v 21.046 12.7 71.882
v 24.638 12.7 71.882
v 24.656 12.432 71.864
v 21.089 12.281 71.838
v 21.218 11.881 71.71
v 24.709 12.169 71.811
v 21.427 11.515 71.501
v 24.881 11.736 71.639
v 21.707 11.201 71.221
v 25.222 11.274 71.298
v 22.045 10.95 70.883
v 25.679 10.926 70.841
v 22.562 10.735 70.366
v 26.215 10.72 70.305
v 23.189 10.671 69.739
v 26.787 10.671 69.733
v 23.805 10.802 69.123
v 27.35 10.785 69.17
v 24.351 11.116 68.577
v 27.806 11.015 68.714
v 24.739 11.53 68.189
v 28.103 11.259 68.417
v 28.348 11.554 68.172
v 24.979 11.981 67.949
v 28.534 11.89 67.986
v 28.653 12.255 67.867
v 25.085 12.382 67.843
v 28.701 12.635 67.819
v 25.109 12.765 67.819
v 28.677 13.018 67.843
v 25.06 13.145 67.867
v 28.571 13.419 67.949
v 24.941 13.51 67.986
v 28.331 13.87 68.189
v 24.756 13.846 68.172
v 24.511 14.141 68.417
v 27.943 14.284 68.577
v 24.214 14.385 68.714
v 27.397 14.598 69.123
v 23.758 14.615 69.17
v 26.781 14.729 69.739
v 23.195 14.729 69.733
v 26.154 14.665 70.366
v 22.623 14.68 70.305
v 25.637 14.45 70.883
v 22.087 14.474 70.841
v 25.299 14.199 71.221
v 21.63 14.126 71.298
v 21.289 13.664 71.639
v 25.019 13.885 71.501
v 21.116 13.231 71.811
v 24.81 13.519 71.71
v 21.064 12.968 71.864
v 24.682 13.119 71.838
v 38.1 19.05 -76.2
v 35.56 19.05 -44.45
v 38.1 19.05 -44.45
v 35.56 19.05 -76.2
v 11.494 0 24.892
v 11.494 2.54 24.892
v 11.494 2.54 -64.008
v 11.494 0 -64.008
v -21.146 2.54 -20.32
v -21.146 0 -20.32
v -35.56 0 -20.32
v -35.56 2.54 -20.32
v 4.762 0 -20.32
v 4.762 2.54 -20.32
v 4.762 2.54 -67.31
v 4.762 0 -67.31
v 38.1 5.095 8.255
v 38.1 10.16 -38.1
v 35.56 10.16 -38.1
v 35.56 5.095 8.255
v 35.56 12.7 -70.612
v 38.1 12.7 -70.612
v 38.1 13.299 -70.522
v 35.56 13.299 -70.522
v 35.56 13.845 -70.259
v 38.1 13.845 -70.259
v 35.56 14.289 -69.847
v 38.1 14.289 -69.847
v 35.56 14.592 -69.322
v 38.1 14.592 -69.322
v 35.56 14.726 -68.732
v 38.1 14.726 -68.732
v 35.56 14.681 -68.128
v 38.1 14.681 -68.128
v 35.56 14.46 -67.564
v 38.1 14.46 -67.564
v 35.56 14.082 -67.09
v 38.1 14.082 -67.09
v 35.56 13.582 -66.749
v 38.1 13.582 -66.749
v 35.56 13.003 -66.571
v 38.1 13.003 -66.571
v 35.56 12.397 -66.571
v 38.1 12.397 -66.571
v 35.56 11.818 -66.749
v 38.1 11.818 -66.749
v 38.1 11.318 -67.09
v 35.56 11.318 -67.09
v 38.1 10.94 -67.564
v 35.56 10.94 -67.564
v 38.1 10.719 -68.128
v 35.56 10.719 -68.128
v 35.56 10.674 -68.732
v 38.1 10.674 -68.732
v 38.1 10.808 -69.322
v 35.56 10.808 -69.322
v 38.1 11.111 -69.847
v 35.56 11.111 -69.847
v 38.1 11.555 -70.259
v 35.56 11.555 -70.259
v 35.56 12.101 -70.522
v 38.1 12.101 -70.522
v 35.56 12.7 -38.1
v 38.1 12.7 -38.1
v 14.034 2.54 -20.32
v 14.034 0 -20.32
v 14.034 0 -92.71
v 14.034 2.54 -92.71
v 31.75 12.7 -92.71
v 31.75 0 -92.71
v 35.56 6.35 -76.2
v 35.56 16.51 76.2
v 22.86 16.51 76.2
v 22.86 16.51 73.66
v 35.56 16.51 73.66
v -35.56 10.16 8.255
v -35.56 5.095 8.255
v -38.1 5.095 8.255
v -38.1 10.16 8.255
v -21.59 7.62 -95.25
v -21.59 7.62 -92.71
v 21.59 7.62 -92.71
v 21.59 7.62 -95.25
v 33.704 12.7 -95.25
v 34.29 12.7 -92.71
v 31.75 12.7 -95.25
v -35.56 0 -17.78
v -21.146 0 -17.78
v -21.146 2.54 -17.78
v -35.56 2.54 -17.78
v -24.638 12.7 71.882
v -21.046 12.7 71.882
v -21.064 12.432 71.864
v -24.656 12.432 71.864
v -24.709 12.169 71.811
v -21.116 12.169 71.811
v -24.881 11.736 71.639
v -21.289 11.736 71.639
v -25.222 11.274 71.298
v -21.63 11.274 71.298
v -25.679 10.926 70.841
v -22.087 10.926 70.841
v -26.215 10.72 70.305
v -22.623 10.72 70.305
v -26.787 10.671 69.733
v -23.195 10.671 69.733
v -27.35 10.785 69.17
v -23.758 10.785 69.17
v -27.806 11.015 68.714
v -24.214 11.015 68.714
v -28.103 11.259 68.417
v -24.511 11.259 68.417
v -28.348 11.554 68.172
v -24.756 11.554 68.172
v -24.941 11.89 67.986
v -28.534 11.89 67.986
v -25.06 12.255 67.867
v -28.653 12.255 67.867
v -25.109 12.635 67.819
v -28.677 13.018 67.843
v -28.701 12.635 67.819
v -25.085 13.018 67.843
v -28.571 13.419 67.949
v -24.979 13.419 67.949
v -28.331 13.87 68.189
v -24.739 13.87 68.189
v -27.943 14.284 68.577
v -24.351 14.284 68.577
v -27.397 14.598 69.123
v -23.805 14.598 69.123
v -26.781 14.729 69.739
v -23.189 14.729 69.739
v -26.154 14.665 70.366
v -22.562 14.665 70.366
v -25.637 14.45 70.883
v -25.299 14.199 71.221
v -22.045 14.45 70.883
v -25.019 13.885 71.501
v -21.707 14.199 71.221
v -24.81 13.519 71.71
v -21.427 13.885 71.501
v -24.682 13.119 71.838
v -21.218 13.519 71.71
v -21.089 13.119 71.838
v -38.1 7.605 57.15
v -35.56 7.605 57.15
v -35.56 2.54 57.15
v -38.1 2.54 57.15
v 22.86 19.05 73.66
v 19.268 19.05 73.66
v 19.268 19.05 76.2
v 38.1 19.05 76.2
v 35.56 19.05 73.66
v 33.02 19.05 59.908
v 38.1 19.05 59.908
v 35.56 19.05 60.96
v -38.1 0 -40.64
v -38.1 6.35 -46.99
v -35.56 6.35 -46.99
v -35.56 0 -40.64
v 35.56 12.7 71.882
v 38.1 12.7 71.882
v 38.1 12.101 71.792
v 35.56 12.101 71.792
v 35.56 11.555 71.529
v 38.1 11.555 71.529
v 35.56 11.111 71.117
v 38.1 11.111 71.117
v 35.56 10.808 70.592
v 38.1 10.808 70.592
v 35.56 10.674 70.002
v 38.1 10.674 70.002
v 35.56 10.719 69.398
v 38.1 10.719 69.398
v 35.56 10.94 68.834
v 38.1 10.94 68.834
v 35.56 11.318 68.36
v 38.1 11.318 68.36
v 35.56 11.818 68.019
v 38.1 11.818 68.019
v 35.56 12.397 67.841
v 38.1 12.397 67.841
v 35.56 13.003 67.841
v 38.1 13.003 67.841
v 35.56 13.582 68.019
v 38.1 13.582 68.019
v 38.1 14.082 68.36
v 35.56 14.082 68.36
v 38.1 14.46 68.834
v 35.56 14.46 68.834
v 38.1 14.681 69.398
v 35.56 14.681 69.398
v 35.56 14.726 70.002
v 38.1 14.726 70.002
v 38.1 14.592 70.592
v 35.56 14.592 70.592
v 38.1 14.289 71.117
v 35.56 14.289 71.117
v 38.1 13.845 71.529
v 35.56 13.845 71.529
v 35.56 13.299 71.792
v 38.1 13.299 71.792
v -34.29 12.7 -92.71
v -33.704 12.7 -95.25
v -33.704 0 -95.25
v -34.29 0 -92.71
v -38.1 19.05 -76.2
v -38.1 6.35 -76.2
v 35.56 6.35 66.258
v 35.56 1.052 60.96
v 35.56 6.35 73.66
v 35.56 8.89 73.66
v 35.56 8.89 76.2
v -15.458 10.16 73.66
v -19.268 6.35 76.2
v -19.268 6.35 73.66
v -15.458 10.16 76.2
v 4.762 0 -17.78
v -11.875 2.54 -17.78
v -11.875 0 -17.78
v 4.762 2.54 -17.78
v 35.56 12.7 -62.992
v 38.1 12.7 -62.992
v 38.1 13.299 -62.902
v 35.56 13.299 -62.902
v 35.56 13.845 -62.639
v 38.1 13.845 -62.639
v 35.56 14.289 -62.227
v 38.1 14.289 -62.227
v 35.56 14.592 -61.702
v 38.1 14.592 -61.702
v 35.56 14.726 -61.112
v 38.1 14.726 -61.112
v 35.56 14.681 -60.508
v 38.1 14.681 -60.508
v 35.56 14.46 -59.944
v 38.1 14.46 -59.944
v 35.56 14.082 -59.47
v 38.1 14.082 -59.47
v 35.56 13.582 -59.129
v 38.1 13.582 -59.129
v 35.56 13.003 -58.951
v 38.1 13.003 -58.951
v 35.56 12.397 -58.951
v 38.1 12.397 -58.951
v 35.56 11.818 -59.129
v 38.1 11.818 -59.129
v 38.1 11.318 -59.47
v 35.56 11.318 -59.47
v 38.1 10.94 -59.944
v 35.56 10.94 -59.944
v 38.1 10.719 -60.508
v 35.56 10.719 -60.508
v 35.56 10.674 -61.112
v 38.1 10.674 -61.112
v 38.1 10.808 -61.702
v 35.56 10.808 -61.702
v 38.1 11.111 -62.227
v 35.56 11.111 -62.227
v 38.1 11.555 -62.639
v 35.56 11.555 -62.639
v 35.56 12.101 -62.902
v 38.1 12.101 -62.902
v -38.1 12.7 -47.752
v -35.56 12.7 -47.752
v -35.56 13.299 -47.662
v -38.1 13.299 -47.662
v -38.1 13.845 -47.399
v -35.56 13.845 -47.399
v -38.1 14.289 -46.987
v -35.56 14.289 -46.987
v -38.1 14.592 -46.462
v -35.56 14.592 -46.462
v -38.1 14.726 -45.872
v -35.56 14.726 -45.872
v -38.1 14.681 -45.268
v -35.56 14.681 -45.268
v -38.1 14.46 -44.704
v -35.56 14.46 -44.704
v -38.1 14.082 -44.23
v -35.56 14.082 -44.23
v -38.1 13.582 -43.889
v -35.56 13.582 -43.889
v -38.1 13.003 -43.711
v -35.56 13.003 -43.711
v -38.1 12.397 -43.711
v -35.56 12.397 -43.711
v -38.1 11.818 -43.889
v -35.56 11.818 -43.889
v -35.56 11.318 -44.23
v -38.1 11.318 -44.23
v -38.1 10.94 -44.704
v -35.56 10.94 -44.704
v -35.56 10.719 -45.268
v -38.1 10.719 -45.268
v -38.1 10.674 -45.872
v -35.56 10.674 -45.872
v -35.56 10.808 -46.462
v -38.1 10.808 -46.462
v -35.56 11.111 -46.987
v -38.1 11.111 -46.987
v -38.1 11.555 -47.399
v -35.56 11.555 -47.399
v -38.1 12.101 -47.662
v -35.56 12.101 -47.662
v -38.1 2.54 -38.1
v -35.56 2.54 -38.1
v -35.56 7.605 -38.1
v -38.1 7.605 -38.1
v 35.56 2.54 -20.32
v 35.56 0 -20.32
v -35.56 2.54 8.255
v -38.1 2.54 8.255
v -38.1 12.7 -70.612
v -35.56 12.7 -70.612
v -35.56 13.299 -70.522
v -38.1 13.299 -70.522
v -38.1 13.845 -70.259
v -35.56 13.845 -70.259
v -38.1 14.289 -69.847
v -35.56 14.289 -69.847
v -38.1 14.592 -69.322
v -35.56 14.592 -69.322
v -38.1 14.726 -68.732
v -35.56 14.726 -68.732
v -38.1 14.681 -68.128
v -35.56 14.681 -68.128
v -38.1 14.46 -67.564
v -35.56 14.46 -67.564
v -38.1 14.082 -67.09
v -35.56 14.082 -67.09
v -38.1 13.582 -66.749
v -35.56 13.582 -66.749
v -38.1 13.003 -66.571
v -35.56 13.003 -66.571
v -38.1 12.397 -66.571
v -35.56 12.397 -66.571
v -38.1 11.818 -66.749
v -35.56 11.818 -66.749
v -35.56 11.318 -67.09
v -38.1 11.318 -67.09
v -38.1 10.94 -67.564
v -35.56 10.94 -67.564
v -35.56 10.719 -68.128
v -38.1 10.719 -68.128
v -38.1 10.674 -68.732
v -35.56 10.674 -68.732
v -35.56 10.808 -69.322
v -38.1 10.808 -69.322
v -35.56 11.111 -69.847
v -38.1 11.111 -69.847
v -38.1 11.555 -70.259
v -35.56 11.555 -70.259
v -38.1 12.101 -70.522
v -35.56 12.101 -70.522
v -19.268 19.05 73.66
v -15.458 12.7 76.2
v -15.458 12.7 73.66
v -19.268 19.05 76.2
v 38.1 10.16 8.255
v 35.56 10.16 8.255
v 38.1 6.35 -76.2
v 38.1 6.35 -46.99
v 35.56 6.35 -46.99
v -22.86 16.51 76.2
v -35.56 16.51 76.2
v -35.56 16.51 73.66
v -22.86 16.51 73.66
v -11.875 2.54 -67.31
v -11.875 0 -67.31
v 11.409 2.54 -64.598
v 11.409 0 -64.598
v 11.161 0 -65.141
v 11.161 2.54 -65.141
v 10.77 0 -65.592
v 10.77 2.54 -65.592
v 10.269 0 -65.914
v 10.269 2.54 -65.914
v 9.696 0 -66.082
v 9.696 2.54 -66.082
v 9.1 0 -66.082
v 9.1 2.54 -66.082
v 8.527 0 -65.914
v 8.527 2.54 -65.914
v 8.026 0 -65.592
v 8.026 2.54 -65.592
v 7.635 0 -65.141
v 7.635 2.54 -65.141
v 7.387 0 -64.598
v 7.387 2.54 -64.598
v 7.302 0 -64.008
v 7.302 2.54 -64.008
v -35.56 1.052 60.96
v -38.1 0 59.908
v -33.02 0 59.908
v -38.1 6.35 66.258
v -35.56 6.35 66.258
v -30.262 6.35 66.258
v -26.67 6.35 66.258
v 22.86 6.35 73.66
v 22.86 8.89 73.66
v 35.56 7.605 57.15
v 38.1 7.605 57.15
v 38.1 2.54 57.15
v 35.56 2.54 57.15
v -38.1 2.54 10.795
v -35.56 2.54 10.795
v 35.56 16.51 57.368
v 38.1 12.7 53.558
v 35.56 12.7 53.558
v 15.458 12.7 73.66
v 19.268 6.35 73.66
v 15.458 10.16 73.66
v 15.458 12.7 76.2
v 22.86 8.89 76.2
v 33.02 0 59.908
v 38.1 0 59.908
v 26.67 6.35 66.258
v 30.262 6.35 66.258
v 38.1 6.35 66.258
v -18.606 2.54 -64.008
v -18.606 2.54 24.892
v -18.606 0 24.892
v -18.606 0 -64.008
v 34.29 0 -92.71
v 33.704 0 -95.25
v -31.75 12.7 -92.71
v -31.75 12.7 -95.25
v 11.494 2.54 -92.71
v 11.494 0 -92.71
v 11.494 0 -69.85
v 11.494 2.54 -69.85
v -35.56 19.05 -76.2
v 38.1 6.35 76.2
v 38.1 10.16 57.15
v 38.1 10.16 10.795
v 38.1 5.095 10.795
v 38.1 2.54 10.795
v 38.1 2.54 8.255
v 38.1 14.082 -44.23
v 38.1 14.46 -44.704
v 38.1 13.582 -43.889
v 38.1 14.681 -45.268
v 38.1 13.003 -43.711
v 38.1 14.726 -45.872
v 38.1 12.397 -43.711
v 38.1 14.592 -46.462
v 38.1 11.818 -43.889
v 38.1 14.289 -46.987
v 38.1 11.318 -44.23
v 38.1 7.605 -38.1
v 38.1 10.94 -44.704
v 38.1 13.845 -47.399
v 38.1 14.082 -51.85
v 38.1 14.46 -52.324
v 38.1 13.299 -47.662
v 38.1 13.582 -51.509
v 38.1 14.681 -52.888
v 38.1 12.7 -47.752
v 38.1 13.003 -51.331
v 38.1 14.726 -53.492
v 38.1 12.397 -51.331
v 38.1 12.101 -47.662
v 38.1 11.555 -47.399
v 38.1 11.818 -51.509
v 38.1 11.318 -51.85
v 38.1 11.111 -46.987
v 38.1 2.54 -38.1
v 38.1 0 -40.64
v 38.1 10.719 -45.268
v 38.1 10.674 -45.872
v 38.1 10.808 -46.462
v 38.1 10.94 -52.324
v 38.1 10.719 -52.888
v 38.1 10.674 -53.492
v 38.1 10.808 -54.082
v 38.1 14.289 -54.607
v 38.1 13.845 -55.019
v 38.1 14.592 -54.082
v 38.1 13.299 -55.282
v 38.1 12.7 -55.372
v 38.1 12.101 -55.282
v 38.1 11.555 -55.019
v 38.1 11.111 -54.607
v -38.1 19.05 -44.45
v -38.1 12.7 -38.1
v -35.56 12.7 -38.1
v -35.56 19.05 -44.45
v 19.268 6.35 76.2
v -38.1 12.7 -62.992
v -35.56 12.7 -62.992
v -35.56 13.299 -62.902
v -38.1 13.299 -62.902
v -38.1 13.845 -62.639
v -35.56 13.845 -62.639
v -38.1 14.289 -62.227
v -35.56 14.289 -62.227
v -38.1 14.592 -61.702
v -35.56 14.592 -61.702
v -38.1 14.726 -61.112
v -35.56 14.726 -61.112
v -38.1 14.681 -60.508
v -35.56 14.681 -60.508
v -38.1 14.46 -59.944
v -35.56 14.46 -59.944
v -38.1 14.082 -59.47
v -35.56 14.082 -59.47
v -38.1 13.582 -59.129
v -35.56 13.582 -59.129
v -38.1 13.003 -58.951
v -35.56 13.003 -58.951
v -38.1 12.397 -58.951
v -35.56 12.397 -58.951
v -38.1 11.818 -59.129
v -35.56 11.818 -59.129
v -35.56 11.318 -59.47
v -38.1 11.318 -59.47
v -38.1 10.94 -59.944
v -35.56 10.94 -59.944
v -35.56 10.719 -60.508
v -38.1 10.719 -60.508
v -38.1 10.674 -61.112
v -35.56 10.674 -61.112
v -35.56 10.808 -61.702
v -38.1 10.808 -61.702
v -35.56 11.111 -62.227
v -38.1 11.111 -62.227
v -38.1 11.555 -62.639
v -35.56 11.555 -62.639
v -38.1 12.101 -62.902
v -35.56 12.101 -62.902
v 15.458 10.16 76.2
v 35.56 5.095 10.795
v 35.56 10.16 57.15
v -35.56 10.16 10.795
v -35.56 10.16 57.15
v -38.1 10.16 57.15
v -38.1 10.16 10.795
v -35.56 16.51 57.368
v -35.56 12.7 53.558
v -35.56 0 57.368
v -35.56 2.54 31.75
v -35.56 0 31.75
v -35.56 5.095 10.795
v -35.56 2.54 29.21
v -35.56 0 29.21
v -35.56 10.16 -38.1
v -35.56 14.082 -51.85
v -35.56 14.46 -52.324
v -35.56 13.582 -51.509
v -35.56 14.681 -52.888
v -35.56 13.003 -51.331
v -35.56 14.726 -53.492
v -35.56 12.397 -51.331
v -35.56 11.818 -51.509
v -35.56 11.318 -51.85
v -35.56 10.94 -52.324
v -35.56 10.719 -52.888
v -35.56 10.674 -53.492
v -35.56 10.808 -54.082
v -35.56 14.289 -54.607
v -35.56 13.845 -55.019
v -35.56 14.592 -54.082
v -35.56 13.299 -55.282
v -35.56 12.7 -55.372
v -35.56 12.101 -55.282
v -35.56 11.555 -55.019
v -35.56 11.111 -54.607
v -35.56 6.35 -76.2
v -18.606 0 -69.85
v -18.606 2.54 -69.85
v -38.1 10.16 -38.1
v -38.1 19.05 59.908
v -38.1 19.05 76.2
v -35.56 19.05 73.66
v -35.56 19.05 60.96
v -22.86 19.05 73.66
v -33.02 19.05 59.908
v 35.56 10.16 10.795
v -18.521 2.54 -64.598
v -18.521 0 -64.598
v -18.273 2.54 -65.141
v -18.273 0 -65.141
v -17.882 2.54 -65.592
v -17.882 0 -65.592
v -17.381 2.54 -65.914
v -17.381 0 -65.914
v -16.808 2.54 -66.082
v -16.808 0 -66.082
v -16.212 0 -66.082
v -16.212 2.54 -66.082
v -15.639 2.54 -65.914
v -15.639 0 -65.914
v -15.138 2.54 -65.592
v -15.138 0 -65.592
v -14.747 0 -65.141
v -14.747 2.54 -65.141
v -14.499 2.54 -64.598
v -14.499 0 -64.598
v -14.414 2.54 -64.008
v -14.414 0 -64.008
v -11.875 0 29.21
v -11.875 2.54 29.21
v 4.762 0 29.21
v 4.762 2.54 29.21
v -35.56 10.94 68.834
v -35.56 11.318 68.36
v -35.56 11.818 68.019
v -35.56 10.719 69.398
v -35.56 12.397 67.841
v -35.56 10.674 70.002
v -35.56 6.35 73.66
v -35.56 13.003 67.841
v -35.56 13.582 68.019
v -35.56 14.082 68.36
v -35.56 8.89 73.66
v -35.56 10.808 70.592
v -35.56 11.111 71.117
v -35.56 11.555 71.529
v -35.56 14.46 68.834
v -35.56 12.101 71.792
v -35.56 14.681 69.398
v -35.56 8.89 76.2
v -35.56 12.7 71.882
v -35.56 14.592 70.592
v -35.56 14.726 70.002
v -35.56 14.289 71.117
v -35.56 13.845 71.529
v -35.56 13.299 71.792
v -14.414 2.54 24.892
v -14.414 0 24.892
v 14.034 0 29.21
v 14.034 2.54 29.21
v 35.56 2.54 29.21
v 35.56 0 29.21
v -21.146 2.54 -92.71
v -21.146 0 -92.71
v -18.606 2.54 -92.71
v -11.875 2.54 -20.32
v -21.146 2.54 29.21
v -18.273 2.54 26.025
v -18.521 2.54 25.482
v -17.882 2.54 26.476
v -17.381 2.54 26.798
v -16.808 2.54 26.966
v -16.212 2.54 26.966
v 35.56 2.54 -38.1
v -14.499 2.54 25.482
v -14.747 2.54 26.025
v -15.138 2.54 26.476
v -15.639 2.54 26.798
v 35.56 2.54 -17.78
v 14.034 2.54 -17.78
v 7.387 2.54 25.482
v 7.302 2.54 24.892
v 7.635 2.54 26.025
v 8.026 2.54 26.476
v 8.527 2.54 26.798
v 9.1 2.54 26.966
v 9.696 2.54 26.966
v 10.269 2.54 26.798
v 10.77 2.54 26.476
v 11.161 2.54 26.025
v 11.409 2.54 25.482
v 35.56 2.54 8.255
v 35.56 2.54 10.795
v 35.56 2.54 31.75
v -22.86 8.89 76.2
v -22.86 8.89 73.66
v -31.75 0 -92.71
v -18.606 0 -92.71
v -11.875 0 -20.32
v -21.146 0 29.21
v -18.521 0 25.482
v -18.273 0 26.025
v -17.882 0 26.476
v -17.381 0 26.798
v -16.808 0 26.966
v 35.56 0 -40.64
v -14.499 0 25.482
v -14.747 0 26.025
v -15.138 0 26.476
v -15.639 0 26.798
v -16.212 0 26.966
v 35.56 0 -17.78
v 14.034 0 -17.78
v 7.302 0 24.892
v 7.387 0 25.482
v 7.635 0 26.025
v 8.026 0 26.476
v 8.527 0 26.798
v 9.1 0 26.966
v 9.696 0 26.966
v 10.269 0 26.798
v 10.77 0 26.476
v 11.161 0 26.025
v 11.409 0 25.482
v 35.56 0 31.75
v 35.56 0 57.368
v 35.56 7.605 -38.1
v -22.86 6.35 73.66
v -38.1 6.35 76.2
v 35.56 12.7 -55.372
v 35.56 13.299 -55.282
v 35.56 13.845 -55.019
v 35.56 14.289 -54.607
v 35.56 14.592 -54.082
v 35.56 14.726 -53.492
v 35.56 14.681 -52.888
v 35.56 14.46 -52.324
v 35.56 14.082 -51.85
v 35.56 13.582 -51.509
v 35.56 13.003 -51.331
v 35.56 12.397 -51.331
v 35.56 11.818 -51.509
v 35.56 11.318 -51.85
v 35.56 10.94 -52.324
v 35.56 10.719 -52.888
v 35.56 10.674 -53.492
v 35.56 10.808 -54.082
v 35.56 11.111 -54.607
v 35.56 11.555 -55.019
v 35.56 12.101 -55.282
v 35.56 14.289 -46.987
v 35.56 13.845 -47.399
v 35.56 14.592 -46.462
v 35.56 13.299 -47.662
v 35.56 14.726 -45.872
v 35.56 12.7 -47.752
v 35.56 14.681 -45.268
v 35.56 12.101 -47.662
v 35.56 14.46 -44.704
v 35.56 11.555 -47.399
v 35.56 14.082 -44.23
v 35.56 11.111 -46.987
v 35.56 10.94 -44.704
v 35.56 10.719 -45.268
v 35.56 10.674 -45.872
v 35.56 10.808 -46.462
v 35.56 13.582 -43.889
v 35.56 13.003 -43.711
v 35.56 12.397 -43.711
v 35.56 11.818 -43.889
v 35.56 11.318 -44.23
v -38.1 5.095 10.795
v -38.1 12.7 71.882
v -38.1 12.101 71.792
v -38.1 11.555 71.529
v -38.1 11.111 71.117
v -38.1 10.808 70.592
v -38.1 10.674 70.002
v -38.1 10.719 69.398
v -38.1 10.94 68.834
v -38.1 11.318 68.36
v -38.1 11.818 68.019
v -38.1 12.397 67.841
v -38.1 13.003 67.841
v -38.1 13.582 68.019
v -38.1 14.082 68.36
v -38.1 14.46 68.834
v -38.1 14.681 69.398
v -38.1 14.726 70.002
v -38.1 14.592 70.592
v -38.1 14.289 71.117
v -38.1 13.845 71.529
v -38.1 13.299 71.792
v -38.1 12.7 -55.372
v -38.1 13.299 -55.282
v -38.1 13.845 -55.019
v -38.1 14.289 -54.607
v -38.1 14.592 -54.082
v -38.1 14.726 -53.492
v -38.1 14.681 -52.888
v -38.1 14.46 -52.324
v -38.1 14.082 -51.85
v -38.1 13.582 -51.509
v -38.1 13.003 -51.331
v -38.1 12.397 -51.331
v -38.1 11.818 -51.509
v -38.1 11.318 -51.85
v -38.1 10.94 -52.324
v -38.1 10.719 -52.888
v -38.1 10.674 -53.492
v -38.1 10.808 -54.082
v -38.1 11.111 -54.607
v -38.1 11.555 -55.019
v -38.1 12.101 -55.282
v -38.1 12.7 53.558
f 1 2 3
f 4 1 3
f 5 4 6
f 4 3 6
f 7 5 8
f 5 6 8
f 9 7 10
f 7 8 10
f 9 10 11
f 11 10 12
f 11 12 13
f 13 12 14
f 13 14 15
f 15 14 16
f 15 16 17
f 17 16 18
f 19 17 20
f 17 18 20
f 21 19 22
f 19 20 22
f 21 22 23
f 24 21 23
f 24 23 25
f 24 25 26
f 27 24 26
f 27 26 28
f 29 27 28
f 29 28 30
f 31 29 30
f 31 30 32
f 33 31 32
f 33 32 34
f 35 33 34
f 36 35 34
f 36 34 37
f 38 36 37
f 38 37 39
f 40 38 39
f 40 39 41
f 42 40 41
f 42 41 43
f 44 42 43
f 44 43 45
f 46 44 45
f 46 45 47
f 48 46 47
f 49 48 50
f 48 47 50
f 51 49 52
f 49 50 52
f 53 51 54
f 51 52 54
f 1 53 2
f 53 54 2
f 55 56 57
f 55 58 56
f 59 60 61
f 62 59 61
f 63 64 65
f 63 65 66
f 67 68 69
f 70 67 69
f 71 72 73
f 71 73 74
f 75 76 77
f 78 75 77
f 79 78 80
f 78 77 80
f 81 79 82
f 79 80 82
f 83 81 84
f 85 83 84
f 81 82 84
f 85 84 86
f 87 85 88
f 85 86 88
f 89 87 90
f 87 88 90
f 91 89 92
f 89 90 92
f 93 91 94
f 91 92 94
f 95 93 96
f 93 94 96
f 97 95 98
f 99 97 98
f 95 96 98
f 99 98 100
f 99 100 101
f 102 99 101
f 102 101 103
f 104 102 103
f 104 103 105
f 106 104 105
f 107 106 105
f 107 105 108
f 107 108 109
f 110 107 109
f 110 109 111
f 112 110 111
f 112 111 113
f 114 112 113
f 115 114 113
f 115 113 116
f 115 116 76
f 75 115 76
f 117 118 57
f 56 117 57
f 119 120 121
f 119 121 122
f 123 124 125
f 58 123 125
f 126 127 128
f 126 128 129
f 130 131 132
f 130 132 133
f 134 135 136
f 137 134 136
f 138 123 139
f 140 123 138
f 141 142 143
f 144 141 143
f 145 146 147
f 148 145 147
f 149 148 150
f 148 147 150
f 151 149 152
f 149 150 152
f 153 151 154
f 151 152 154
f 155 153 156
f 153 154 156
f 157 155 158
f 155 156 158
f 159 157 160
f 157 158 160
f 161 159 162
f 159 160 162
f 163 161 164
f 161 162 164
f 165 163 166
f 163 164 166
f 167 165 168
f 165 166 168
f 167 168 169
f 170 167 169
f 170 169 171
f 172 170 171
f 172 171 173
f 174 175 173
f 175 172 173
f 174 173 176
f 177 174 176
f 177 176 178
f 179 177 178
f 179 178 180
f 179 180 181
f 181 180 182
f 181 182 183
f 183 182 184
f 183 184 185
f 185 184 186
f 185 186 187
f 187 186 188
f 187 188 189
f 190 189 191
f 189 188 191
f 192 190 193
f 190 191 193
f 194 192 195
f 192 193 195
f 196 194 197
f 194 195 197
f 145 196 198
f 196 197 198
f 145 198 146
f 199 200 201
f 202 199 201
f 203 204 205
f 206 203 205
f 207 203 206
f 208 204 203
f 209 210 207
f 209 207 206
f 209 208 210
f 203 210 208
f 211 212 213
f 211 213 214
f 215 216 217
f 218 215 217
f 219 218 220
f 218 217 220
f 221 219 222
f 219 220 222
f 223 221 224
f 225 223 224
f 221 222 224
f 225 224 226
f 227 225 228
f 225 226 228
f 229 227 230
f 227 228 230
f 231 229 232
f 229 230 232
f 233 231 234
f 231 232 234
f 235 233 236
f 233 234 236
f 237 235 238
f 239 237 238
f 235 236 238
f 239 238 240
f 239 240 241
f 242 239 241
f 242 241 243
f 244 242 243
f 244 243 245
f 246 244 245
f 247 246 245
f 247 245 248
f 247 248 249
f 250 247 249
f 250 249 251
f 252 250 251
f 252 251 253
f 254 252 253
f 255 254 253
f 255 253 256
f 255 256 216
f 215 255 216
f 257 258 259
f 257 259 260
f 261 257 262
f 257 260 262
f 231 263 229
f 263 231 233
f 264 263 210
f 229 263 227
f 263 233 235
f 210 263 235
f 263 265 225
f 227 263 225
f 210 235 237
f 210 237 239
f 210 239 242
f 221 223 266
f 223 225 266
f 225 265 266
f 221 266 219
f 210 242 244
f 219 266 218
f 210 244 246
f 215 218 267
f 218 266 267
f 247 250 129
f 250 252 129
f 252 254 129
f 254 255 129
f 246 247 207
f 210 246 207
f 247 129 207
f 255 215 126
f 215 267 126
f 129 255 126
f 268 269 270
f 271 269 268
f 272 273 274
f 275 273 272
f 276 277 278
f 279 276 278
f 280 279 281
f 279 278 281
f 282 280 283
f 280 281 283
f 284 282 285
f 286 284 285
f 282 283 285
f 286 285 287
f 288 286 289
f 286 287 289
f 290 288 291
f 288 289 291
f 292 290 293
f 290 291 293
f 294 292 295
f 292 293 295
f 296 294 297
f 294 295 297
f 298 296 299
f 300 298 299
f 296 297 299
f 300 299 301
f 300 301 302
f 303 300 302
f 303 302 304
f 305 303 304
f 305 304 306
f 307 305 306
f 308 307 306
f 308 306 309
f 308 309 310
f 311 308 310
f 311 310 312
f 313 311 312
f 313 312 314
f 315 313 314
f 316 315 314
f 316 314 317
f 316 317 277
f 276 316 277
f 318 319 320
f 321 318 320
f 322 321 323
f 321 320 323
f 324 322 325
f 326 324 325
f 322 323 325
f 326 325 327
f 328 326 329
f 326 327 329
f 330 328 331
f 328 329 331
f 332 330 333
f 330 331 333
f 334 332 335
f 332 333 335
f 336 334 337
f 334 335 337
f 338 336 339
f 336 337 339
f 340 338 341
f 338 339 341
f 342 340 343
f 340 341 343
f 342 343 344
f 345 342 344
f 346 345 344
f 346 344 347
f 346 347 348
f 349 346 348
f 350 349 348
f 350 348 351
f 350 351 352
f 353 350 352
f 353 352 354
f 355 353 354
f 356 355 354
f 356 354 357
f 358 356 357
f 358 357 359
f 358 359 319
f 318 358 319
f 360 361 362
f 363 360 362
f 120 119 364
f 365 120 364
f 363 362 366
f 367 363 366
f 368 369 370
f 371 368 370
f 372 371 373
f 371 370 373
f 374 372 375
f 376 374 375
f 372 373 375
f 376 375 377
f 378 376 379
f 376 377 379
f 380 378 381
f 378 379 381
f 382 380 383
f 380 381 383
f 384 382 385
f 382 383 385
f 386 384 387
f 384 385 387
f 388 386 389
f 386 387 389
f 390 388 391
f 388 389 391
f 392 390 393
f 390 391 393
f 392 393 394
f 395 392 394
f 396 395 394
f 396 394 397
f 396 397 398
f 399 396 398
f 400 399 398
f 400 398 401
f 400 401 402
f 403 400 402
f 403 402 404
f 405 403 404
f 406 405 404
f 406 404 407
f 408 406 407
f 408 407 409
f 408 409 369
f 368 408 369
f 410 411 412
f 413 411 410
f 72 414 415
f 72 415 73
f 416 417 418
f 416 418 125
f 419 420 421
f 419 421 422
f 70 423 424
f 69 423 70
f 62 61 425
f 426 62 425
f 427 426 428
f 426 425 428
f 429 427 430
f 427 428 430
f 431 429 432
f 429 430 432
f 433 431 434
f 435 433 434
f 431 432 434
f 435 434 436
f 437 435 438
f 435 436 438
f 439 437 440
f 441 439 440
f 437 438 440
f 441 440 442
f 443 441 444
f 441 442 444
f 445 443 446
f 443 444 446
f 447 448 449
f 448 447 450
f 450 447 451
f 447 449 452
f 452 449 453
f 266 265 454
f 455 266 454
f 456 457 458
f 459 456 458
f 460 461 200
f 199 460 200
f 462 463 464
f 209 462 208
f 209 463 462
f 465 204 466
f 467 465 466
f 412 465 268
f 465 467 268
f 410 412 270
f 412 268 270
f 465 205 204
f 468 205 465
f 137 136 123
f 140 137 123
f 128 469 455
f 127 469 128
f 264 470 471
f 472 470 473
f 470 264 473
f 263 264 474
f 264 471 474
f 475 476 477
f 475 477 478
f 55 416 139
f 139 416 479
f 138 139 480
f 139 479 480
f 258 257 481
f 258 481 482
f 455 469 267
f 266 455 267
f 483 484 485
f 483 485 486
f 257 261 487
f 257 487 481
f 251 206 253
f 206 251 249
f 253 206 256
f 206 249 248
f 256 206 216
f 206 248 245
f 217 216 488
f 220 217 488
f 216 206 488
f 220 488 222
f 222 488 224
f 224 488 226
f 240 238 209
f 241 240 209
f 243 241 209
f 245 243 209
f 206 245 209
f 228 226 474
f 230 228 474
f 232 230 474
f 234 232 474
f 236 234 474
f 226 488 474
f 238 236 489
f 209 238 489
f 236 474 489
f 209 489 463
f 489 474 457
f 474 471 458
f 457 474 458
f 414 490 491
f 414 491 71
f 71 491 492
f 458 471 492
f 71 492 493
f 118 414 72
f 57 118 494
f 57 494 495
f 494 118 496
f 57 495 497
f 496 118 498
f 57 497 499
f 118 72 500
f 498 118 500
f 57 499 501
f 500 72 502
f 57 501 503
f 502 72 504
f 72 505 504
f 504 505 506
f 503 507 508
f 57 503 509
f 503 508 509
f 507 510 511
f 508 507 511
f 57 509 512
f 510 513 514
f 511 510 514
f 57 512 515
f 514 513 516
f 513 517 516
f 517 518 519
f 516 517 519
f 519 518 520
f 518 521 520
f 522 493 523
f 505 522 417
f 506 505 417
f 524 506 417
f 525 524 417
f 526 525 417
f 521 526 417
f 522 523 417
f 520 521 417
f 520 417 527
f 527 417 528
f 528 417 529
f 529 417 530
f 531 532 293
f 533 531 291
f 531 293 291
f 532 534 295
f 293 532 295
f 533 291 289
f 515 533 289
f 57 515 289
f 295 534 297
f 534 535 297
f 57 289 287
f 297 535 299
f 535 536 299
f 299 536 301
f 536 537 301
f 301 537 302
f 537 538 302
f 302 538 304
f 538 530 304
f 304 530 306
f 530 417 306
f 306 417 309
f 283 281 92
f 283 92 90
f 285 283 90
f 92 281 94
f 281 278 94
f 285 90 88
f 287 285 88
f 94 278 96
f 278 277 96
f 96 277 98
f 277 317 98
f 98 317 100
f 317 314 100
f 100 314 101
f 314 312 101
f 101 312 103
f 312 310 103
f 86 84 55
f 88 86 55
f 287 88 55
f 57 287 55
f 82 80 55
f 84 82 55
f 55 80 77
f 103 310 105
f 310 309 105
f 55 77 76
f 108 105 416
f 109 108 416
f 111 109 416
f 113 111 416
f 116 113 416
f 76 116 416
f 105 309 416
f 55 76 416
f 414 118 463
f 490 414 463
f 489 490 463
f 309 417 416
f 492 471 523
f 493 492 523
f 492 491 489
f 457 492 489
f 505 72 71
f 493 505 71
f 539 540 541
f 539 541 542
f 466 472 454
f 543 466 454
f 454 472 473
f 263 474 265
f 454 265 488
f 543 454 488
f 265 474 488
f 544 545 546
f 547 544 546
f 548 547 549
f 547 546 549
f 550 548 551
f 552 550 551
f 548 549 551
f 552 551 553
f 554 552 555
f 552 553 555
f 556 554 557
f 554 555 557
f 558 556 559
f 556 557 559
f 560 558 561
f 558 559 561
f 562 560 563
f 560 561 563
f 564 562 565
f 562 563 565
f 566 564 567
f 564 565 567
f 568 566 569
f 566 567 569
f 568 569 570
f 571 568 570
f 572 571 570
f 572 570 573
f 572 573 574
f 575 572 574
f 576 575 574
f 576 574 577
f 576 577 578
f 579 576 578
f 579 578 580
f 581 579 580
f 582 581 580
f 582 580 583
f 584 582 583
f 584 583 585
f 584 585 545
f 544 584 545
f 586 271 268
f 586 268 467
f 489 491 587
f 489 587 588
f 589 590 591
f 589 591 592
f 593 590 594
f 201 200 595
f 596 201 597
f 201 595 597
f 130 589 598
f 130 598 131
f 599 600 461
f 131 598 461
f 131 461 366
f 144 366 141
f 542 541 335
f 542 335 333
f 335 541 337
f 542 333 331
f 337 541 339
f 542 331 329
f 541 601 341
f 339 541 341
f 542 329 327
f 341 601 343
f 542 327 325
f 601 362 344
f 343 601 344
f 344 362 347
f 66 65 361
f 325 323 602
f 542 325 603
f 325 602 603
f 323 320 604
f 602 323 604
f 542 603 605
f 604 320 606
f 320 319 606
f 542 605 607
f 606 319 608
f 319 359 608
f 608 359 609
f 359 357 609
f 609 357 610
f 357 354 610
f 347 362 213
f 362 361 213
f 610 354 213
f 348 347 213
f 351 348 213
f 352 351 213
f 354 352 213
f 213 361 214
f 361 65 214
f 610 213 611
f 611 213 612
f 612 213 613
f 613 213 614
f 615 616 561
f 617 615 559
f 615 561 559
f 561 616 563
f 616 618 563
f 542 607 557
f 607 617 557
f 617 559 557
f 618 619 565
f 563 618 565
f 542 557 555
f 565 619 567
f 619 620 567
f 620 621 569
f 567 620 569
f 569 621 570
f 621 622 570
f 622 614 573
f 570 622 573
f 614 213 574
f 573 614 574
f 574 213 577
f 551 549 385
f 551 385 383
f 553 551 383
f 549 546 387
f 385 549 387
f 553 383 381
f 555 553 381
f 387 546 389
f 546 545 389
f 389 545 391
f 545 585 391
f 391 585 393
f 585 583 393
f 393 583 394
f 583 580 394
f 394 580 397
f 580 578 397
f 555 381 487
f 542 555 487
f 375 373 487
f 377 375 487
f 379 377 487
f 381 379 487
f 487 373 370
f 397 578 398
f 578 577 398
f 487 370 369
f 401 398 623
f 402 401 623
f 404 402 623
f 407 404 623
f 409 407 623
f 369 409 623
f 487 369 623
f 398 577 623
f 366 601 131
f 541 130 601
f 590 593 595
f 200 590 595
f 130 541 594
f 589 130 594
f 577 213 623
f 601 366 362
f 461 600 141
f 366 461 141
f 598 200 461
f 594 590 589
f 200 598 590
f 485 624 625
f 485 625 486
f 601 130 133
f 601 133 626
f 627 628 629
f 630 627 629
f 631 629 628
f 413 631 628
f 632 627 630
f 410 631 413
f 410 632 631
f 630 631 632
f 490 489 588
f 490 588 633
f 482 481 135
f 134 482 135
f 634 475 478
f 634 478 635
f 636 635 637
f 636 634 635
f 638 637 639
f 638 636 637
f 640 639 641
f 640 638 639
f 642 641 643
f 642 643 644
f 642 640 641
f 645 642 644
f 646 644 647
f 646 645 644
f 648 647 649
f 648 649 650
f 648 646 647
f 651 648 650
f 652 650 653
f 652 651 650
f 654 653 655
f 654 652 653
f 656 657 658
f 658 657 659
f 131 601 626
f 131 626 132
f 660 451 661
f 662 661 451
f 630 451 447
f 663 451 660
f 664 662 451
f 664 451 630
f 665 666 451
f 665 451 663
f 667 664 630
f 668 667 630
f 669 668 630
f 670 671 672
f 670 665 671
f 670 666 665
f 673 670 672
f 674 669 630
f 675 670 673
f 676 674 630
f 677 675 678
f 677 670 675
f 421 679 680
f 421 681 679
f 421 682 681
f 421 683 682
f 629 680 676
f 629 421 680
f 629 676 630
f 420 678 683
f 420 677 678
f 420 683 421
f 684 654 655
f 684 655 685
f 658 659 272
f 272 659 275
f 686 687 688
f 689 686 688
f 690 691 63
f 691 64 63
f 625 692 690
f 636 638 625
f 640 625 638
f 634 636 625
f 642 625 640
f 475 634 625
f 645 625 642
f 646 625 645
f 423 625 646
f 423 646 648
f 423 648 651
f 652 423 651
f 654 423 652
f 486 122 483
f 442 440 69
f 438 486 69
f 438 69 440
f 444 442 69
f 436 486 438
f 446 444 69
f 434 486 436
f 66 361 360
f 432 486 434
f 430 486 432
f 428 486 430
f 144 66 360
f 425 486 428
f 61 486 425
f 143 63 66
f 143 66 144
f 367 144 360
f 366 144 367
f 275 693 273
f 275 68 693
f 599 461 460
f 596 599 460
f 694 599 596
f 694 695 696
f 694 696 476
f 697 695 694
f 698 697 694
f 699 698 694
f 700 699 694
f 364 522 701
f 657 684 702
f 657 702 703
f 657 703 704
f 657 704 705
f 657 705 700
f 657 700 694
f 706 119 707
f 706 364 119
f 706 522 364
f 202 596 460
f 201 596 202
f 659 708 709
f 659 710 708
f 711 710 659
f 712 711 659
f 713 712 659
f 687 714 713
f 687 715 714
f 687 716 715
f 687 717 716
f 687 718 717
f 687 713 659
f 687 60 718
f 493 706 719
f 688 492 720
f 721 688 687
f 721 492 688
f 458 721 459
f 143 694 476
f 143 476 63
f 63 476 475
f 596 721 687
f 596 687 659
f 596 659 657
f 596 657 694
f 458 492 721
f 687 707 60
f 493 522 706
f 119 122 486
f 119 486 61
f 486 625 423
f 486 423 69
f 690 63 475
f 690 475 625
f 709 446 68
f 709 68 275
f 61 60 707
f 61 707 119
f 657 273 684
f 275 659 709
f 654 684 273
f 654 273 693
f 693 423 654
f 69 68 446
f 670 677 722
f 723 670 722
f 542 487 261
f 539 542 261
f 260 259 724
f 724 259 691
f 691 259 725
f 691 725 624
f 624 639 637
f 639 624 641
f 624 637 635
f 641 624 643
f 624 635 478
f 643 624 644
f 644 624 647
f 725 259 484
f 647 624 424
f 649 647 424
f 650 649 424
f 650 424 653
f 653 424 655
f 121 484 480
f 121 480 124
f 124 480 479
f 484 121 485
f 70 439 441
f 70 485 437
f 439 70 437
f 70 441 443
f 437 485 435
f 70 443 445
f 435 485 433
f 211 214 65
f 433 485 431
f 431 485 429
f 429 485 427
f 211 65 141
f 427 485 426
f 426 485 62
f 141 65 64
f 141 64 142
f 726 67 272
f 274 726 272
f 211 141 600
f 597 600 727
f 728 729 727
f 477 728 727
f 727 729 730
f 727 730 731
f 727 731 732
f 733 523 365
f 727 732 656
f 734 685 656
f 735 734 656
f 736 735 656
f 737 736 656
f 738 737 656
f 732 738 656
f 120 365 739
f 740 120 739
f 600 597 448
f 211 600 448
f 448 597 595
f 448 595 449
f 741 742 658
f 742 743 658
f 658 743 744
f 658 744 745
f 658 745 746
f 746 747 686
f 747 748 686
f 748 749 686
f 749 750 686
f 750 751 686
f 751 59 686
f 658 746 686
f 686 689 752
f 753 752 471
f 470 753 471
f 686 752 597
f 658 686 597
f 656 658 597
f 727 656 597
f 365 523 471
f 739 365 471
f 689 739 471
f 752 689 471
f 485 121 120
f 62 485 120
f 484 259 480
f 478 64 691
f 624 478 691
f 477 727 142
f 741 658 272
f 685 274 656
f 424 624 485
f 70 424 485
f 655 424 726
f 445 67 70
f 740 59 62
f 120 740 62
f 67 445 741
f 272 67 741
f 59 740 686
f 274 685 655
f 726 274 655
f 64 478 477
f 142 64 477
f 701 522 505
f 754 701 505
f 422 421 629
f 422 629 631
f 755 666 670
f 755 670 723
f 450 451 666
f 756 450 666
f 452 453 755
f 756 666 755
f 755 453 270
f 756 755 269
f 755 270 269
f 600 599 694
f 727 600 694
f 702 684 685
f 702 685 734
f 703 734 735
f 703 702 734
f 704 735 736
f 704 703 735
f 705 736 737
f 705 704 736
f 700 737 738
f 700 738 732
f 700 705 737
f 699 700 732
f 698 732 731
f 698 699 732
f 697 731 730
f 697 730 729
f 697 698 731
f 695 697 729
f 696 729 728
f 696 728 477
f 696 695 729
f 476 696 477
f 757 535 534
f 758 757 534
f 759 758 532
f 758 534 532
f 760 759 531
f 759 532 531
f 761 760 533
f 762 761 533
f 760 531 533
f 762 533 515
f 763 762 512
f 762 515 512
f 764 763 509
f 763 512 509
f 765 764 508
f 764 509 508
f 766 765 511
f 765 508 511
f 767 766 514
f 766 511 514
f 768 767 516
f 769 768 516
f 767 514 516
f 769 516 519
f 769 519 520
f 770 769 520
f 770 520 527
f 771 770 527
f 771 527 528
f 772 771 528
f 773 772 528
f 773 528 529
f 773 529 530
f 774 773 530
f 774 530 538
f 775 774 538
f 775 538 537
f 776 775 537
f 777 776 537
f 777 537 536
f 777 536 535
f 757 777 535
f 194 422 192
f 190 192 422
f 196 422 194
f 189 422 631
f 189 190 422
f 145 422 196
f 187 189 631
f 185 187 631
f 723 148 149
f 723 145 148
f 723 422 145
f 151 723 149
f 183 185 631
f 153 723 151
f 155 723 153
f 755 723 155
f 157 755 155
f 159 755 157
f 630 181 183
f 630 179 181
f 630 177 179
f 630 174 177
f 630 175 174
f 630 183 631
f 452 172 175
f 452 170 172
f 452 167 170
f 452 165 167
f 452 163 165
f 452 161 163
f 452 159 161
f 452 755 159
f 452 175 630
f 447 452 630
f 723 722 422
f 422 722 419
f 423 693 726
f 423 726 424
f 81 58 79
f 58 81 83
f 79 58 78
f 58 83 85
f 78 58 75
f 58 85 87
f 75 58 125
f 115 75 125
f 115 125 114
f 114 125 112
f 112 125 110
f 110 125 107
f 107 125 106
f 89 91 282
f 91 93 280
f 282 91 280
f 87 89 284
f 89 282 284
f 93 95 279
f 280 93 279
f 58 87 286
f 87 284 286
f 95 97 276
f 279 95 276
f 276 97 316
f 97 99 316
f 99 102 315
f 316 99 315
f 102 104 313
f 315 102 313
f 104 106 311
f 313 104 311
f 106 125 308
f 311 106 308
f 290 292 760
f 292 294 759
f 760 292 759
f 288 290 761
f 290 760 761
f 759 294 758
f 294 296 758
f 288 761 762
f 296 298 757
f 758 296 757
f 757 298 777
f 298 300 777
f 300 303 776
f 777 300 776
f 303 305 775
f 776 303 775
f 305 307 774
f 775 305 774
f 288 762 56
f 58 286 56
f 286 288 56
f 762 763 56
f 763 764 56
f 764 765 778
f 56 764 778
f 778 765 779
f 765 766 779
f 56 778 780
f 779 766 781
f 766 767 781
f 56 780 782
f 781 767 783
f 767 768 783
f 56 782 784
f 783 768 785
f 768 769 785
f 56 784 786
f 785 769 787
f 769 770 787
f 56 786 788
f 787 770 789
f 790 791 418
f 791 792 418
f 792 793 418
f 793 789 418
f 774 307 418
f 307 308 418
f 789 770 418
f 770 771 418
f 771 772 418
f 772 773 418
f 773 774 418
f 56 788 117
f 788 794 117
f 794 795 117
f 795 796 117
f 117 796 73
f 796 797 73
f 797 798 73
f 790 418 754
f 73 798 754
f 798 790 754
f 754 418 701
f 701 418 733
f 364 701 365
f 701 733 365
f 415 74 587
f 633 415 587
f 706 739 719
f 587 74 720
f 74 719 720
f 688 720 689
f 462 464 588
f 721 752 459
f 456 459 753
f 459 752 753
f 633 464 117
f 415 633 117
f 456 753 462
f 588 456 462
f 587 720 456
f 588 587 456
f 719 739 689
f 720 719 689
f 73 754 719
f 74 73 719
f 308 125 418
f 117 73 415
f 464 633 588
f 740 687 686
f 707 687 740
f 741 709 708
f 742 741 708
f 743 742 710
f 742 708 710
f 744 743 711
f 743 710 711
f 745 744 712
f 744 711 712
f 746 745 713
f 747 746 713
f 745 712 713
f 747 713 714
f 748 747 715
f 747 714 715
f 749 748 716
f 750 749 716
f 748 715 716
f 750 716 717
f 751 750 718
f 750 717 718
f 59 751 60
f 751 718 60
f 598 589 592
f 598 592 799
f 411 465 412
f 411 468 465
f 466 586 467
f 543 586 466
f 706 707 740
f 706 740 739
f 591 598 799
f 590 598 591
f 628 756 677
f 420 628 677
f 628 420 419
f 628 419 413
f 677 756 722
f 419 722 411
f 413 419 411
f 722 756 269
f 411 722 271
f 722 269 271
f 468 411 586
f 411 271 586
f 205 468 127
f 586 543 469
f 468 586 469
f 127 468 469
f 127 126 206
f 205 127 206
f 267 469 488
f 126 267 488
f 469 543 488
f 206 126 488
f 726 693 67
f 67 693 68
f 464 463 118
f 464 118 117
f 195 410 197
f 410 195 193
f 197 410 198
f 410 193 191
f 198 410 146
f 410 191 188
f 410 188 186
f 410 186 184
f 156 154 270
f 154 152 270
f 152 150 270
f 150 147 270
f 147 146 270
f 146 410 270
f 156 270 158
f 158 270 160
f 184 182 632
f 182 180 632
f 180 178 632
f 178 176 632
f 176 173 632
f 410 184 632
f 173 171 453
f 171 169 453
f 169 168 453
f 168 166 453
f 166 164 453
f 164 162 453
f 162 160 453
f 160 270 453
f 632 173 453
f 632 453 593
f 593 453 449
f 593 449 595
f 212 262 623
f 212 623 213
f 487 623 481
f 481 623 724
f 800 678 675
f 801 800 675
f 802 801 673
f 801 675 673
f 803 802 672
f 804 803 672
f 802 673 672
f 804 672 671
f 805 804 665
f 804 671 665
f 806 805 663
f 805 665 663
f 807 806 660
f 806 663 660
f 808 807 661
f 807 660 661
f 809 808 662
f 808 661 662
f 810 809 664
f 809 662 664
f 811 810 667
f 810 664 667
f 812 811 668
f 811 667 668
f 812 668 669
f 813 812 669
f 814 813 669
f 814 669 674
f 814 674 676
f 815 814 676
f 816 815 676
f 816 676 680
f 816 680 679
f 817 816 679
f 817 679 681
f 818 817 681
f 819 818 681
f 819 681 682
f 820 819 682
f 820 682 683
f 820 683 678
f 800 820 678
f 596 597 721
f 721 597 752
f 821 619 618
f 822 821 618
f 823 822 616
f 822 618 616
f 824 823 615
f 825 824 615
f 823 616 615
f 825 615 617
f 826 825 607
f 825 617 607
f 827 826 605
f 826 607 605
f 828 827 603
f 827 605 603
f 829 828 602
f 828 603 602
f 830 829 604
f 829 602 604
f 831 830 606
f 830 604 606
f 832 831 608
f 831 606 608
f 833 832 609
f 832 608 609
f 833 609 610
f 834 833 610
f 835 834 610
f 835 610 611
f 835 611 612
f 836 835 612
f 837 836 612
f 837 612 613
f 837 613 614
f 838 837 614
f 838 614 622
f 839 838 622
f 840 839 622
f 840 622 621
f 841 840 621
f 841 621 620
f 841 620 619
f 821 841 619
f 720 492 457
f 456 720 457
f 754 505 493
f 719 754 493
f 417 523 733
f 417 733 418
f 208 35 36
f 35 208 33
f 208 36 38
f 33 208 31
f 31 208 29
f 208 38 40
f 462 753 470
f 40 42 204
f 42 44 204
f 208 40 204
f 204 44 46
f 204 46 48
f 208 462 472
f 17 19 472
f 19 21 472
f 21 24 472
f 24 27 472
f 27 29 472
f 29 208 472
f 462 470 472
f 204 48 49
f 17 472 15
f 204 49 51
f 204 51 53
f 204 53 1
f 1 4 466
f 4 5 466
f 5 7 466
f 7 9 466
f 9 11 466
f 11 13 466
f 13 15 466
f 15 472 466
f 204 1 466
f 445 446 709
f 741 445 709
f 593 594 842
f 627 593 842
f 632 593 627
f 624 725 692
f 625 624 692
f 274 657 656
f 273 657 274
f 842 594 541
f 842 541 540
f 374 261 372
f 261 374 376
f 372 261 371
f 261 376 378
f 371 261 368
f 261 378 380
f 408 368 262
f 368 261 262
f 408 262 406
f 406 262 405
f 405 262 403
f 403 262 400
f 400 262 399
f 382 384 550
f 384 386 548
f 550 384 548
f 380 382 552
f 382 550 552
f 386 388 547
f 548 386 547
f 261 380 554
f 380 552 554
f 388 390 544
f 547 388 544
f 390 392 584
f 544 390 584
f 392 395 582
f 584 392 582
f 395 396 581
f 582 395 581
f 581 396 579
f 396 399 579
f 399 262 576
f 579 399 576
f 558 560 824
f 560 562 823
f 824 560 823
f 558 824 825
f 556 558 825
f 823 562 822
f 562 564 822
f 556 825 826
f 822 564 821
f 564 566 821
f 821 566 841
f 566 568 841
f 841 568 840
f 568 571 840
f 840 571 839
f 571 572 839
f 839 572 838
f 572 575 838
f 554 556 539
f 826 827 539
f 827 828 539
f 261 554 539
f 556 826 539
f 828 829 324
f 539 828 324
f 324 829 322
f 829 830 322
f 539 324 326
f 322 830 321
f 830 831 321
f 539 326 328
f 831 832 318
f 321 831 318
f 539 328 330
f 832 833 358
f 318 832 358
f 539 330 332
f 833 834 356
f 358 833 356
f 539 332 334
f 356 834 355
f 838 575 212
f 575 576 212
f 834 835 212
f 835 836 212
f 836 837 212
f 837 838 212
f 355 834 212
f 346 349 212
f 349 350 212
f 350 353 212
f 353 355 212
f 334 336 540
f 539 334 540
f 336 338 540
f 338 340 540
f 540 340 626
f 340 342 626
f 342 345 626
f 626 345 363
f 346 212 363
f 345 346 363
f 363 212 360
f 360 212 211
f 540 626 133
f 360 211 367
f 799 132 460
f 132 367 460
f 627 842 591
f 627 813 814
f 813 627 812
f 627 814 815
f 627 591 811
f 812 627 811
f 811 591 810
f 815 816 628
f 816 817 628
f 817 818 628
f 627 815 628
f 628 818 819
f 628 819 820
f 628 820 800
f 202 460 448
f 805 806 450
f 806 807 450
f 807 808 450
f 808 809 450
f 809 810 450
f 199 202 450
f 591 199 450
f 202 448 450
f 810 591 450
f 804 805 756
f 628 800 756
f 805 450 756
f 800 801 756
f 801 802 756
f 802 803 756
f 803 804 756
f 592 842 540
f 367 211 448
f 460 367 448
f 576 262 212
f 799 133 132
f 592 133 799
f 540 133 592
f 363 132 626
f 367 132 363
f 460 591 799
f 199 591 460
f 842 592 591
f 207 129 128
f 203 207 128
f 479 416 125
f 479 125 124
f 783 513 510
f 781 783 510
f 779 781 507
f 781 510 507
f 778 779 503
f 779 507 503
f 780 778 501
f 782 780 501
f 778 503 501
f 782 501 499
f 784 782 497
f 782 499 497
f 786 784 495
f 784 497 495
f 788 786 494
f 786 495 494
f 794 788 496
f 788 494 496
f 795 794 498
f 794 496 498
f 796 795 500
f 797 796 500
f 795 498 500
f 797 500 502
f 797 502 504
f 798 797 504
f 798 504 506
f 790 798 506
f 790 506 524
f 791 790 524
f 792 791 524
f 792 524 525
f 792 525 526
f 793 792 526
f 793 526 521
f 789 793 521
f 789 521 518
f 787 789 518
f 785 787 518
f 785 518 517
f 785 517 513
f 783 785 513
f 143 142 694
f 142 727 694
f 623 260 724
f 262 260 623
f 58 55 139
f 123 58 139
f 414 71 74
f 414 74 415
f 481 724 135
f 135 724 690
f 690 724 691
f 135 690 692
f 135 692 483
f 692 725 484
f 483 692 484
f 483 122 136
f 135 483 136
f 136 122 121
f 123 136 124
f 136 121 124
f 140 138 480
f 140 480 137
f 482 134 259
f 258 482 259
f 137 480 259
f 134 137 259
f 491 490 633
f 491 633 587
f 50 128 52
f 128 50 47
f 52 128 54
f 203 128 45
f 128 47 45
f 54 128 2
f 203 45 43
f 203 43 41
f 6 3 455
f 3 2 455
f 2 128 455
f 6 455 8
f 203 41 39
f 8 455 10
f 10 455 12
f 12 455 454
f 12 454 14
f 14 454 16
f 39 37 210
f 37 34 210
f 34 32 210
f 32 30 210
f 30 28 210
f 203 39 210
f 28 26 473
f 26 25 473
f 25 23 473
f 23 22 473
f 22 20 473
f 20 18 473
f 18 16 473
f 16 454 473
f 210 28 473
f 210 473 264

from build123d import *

# Parameters (mm, degrees)
BOSS_EXTRUDE1_DEPTH = 12.7
CUT_EXTRUDE3_DEPTH  = 77.2
SKETCH8_W           = 71.12
SKETCH8_H           = 101.6
BOSS_EXTRUDE3_DEPTH = 2.54
SKETCH9_W           = 14.4145
SKETCH9_H           = 99.06
SKETCH9_W_2         = 21.5265
SKETCH9_H_2         = 49.53
SKETCH9_W_3         = 16.637
SKETCH9_H_3         = 46.99
CUT_EXTRUDE4_DEPTH  = 2.54
BOSS_EXTRUDE4_DEPTH = 12.7
SKETCH19_W          = 2.54
SKETCH19_H          = 2.54
BOSS_EXTRUDE6_DEPTH = 25.4
BOSS_EXTRUDE7_DEPTH = 6.35
BOSS_EXTRUDE8_DEPTH = 6.35
CUT_EXTRUDE9_DEPTH  = 77.2
CUT_EXTRUDE10_DEPTH = 2.54
SKETCH28_W          = 12.7
SKETCH28_H          = 7.62
CUT_EXTRUDE11_DEPTH = 2.54
CUT_EXTRUDE12_DEPTH = 12.7
CUT_EXTRUDE13_DEPTH = 12.7
SKETCH32_R          = 2.032
CUT_EXTRUDE15_DEPTH = 77.2
SKETCH33_W          = 2.54
SKETCH33_H          = 2.54
BOSS_EXTRUDE9_DEPTH = 15.24
CUT_EXTRUDE17_DEPTH = 2.54


with BuildPart() as part:
    # Sketch1 → Boss-Extrude1 (new body)
    with BuildSketch(Plane(origin=(0, 0, 0), x_dir=(1, 0, 0), z_dir=(0, 1, 0))):
        Polygon((38.1, -76.2), (38.1, 76.2), (35.56, 76.2), (35.56, -57.367897552), (19.267897552, -73.66), (-19.267897552, -73.66), (-35.56, -57.367897552), (-35.56, 76.2), (-38.1, 76.2), (-38.1, -76.2), align=None)
        Polygon((-35.56, -73.66), (-22.86, -73.66), (-35.56, -60.96), align=None, mode=Mode.SUBTRACT)
        Polygon((22.86, -73.66), (35.56, -60.96), (35.56, -73.66), align=None, mode=Mode.SUBTRACT)
    extrude(amount=BOSS_EXTRUDE1_DEPTH)

    # Sketch7 → Cut-Extrude3 (cut, through all)
    with BuildSketch(Plane(origin=(38.1, 0, 0), x_dir=(0, 0, -1), z_dir=(1, 0, 0))):
        Polygon((-57.15, 10.16), (-10.795093656, 10.16), (-10.795093656, 5.095127003), align=None)
        Polygon((-57.15, 7.60488323), (-57.15, 2.54), (-10.795, 2.54), align=None)
        Polygon((-8.255093656, 10.16), (38.1, 10.16), (-8.255093656, 5.095106537), align=None)
        Polygon((-8.255, 2.54), (38.1, 2.54), (38.1, 7.60488323), align=None)
    extrude(amount=-CUT_EXTRUDE3_DEPTH, mode=Mode.SUBTRACT)

    # Sketch8 → Boss-Extrude3 (add)
    with BuildSketch(Plane.XZ):
        with Locations((0, -19.05)):
            Rectangle(SKETCH8_W, SKETCH8_H)
    extrude(amount=-BOSS_EXTRUDE3_DEPTH)

    # Sketch9 → Cut-Extrude4 (cut)
    with BuildSketch(Plane(origin=(0, 2.54, 0), x_dir=(1, 0, 0), z_dir=(0, 1, 0))):
        with Locations((-28.35275, 20.32)):
            Rectangle(SKETCH9_W, SKETCH9_H)
        with BuildLine():
            Line((-14.4145, 64.008), (-14.4145, -24.892))
            ThreePointArc((-14.4145, -24.892), (-16.51, -26.9875), (-18.6055, -24.892))
            Line((-18.6055, -24.892), (-18.6055, 64.008))
            ThreePointArc((-18.6055, 64.008), (-16.51, 66.1035), (-14.4145, 64.008))
        make_face()
        with Locations((24.79675, 45.085)):
            Rectangle(SKETCH9_W_2, SKETCH9_H_2)
        with Locations((-3.556, 43.815)):
            Rectangle(SKETCH9_W_3, SKETCH9_H_3)
        with BuildLine():
            Line((7.3025, 64.008), (7.3025, -24.892))
            ThreePointArc((7.3025, -24.892), (9.398, -26.9875), (11.4935, -24.892))
            Line((11.4935, -24.892), (11.4935, 64.008))
            ThreePointArc((11.4935, 64.008), (9.398, 66.1035), (7.3025, 64.008))
        make_face()
        with Locations((-3.556, -5.715)):
            Rectangle(SKETCH9_W_3, SKETCH9_H_3)
        with Locations((24.79675, -5.715)):
            Rectangle(SKETCH9_W_2, SKETCH9_H_3)
    extrude(amount=-CUT_EXTRUDE4_DEPTH, mode=Mode.SUBTRACT)

    # Sketch16 → Boss-Extrude4 (add)
    with BuildSketch(Plane.XZ):
        Polygon((-35.56, -76.2), (-31.75, -92.71), (31.75, -92.71), (35.56, -76.2), (38.1, -76.2), (33.703846154, -95.25), (-33.703846154, -95.25), (-38.1, -76.2), align=None)
    extrude(amount=-BOSS_EXTRUDE4_DEPTH)

    # Sketch19 → Boss-Extrude6 (add)
    with BuildSketch(Plane(origin=(0, 0, -69.85), x_dir=(-1, 0, 0), z_dir=(0, 0, -1))):
        with Locations((19.8755, 1.27)):
            Rectangle(SKETCH19_W, SKETCH19_H)
        with Locations((-12.7635, 1.27)):
            Rectangle(SKETCH19_W, SKETCH19_H)
    extrude(amount=BOSS_EXTRUDE6_DEPTH)

    # Sketch21 → Boss-Extrude7 (add)
    with BuildSketch(Plane(origin=(0, 12.7, 0), x_dir=(1, 0, 0), z_dir=(0, 1, 0))):
        Polygon((38.1, 38.1), (38.1, 76.2), (33.703846154, 95.25), (31.75, 92.71), (35.56, 76.2), (35.56, 38.1), align=None)
        Polygon((-35.56, 38.1), (-38.1, 38.1), (-38.1, 76.2), (-33.703846154, 95.25), (-31.75, 92.71), (-35.56, 76.2), align=None)
    extrude(amount=BOSS_EXTRUDE7_DEPTH)

    # Sketch24 → Boss-Extrude8 (add)
    with BuildSketch(Plane(origin=(0, 12.7, 0), x_dir=(1, 0, 0), z_dir=(0, 1, 0))):
        Polygon((-38.1, -57.367897552), (-38.1, -76.2), (-19.267897552, -76.2), (-15.457897552, -76.2), (-15.457897552, -73.66), (-19.267897552, -73.66), (-35.56, -57.367897552), (-35.56, -53.557897552), (-38.1, -53.557897552), align=None)
        Polygon((-22.86, -73.66), (-35.56, -60.96), (-35.56, -73.66), align=None, mode=Mode.SUBTRACT)
        Polygon((19.267897552, -76.2), (38.1, -76.2), (38.1, -57.367897552), (38.1, -53.557897552), (35.56, -53.557897552), (35.56, -57.367897552), (19.267897552, -73.66), (15.457897552, -73.66), (15.457897552, -76.2), align=None)
        Polygon((22.86, -73.66), (35.56, -60.96), (35.56, -73.66), align=None, mode=Mode.SUBTRACT)
    extrude(amount=BOSS_EXTRUDE8_DEPTH)

    # Sketch26 → Cut-Extrude9 (cut, through all)
    with BuildSketch(Plane(origin=(38.1, 0, 0), x_dir=(0, 0, -1), z_dir=(1, 0, 0))):
        Polygon((-53.557897552, 12.7), (-59.907897552, 19.05), (-53.557897552, 19.05), align=None)
        Polygon((-59.907897552, 0), (-66.257897552, 6.35), (-76.2, 6.35), (-76.2, 0), align=None)
    extrude(amount=-CUT_EXTRUDE9_DEPTH, mode=Mode.SUBTRACT)

    # Sketch27 → Cut-Extrude10 (cut)
    with BuildSketch(Plane.XY.offset(76.2)):
        Polygon((-15.457897552, 12.7), (-19.267897552, 19.05), (-15.457897552, 19.05), align=None)
        Polygon((15.457897552, 12.7), (15.457897552, 19.05), (19.267897552, 19.05), align=None)
        Polygon((-19.267897552, 6.35), (-15.457897552, 10.16), (15.457897552, 10.16), (19.267897552, 6.35), align=None)
    extrude(amount=-CUT_EXTRUDE10_DEPTH, mode=Mode.SUBTRACT)

    # Sketch28 → Cut-Extrude11 (cut)
    with BuildSketch(Plane.XY.offset(76.2)):
        with Locations((-29.21, 12.7)):
            Rectangle(SKETCH28_W, SKETCH28_H)
        with Locations((29.21, 12.7)):
            Rectangle(SKETCH28_W, SKETCH28_H)
    extrude(amount=-CUT_EXTRUDE11_DEPTH, mode=Mode.SUBTRACT)

    # Sketch29 → Cut-Extrude12 (cut)
    with BuildSketch(Plane(origin=(38.1, 0, 0), x_dir=(0, 0, -1), z_dir=(1, 0, 0))):
        Polygon((38.1, 12.7), (44.45, 19.05), (38.1, 19.05), align=None)
        Polygon((40.64, 0), (46.99, 6.35), (76.2, 6.35), (92.71, 0), align=None)
        Polygon((76.2, 19.05), (92.71, 12.7), (95.25, 12.7), (95.25, 19.05), align=None)
    extrude(amount=-CUT_EXTRUDE12_DEPTH, mode=Mode.SUBTRACT)

    # Sketch30 → Cut-Extrude13 (cut)
    with BuildSketch(Plane.ZY.offset(38.1)):
        Polygon((-38.1, 12.7), (-44.45, 19.05), (-38.1, 19.05), align=None)
        Polygon((-46.99, 6.35), (-40.64, 0), (-92.71, 0), (-76.2, 6.35), align=None)
        Polygon((-76.2, 19.05), (-92.71, 12.7), (-95.25, 12.7), (-95.25, 19.05), align=None)
    extrude(amount=-CUT_EXTRUDE13_DEPTH, mode=Mode.SUBTRACT)

    # Sketch32 → Cut-Extrude15 (cut, through all)
    with BuildSketch(Plane(origin=(38.1, 0, 0), x_dir=(0, 0, -1), z_dir=(1, 0, 0))):
        with Locations((45.72, 12.7)):
            Circle(SKETCH32_R)
        with Locations((53.34, 12.7)):
            Circle(SKETCH32_R)
        with Locations((60.96, 12.7)):
            Circle(SKETCH32_R)
        with Locations((68.58, 12.7)):
            Circle(SKETCH32_R)
        with Locations(Location((-69.85, 12.7, 0), (0, 0, 180))):  # turned: the seam where the file's is
            Circle(SKETCH32_R)
    extrude(amount=-CUT_EXTRUDE15_DEPTH, mode=Mode.SUBTRACT)

    # Sketch33 → Boss-Extrude9 (add)
    with BuildSketch(Plane.ZY.offset(21.1455)):
        with Locations((-19.05, 1.27)):
            Rectangle(SKETCH33_W, SKETCH33_H)
    extrude(amount=BOSS_EXTRUDE9_DEPTH)

    # Sketch35 → Cut-Extrude17 (cut)
    with BuildSketch(Plane.XY.offset(-92.71)):
        Polygon((-31.75, 12.7), (-21.59, 7.62), (21.59, 7.62), (31.75, 12.7), align=None)
    extrude(amount=-CUT_EXTRUDE17_DEPTH, mode=Mode.SUBTRACT)


solid = part.part
